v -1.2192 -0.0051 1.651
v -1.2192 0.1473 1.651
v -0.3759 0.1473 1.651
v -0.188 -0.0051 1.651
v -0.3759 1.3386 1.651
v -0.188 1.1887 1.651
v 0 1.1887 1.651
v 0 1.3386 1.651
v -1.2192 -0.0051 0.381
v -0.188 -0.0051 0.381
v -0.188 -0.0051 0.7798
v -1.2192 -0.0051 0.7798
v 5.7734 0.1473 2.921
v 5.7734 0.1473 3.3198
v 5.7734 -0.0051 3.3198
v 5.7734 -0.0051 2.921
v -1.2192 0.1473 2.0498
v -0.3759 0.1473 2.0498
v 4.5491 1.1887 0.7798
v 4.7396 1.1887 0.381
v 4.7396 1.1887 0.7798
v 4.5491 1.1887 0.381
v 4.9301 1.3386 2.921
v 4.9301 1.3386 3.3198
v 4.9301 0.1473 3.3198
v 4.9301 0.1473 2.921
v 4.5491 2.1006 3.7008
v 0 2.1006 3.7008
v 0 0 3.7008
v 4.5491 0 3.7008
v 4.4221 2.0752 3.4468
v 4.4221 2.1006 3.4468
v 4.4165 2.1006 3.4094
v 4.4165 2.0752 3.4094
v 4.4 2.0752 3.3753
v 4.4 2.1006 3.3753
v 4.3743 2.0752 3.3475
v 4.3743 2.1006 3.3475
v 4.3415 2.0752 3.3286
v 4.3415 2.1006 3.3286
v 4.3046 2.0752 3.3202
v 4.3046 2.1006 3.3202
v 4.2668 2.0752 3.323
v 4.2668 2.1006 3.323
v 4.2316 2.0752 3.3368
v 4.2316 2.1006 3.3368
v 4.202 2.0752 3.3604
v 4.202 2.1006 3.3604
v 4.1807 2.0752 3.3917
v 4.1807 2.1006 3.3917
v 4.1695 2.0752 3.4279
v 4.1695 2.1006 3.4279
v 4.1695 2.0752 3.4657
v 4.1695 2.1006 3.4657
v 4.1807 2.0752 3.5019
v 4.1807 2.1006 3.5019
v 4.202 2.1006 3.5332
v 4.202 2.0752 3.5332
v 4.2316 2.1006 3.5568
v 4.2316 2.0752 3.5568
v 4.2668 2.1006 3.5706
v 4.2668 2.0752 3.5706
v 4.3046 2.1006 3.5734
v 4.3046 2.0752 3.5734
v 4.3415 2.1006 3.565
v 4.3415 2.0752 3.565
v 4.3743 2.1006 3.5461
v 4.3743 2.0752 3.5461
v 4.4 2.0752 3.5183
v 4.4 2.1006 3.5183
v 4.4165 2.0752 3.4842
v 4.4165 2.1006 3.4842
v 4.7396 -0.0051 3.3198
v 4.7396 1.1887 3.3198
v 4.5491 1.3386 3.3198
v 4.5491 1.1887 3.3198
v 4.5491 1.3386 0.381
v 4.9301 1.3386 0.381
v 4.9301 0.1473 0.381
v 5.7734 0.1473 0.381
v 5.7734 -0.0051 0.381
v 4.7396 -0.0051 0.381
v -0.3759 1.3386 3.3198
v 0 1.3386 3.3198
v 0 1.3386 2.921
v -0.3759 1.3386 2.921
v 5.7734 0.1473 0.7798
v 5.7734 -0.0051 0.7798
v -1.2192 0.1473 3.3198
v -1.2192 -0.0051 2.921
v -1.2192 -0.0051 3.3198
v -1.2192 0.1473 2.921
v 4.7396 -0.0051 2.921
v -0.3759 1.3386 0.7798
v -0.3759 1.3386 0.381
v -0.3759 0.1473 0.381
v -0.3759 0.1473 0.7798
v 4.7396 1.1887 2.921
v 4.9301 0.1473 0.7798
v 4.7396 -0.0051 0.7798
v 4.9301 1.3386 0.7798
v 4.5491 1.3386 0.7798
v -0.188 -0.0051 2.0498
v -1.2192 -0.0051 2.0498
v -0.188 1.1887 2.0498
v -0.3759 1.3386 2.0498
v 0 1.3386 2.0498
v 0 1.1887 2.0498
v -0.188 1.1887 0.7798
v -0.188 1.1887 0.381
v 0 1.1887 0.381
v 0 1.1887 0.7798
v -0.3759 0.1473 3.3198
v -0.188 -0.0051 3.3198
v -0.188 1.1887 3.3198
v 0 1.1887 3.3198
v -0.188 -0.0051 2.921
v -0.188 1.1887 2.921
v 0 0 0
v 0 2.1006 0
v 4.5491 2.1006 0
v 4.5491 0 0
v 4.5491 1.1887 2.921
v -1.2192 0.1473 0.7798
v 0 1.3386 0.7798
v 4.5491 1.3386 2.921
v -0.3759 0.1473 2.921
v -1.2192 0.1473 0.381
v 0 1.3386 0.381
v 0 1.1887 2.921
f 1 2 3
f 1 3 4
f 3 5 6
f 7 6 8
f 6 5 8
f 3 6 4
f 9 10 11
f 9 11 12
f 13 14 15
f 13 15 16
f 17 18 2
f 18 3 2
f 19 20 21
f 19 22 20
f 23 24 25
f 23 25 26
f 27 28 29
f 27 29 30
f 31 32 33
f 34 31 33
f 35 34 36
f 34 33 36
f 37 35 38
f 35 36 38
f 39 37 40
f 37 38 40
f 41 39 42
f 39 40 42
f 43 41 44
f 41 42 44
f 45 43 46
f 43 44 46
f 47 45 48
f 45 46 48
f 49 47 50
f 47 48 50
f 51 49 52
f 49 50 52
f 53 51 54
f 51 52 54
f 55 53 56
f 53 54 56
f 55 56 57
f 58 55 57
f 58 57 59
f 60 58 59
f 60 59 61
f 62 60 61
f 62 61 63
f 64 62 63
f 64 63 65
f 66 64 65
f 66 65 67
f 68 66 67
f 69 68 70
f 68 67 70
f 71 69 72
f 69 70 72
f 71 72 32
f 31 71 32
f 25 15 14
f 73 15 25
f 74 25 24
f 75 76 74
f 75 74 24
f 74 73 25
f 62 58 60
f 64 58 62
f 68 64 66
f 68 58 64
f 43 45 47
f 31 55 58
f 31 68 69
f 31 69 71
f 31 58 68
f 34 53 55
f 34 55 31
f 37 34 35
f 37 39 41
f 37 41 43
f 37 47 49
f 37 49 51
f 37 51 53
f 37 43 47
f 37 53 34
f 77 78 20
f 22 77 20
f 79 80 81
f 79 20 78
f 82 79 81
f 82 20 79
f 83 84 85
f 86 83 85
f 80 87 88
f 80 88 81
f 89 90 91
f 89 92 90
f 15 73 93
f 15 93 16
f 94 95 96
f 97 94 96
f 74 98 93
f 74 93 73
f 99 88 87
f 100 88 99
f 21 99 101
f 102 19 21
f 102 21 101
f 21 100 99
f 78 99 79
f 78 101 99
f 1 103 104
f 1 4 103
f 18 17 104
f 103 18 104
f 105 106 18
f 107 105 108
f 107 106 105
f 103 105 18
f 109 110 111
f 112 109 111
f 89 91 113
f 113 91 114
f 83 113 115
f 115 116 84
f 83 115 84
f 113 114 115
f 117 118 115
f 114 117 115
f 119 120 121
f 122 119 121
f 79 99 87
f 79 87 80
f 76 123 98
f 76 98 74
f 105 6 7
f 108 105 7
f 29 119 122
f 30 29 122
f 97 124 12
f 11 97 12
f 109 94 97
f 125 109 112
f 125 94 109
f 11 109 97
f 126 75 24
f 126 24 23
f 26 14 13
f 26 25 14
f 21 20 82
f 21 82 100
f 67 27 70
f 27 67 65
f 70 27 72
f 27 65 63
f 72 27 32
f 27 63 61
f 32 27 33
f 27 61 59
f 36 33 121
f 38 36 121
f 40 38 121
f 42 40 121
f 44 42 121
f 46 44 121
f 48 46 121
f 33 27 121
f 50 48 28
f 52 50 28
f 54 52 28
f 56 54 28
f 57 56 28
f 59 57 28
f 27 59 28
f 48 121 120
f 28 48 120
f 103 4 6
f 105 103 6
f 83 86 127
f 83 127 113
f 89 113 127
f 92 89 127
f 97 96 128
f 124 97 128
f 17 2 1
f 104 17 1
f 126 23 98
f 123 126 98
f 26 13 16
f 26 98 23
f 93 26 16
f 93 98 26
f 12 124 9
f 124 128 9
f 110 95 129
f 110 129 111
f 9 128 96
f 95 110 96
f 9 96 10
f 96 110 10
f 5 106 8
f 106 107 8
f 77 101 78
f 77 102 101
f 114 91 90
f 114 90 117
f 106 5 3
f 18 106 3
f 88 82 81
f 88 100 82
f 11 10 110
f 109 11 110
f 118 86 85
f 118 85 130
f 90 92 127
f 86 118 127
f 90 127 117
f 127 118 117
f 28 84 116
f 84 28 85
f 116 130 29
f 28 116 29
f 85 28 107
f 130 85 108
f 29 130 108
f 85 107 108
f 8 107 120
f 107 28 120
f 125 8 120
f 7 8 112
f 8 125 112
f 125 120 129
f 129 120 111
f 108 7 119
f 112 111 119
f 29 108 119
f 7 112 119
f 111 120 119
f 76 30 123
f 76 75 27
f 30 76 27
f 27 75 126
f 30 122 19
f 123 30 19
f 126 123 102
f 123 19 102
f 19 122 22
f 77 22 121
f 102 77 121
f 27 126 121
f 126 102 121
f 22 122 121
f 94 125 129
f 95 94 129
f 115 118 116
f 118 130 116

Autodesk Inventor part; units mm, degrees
ref_plane "YZ Plane" through (0, 0, 0) normal (1, 0, 0) x (0, 1, 0)
ref_plane "XZ Plane" through (0, 0, 0) normal (0, 1, 0) x (-1, 0, 0)
ref_plane "XY Plane" through (0, 0, 0) normal (0, 0, 1) x (1, 0, 0)
sketch "Sketch1" plane through (0, 0, 0) normal (0, 0, 1) x (1, 0, 0)
  line L0 (0, 0) -> (4.5491, 0)
  line L1 (4.5491, 0) -> (4.5491, 2.1006)
  line L2 (4.5491, 2.1006) -> (0, 2.1006)
  line L3 (0, 2.1006) -> (0, 0)
  dimension "d0" = 2.1006
  dimension "d1" = 4.5491
extrude "Extrusion1" add sketch "Sketch1" along normal blind 3.7008
sketch "Sketch2" plane through (4.5491, 0, 0) normal (1, 0, 0) x (0, 0, -1)
  line L0 (-3.3198, 1.3386) -> (-2.921, 1.3386)
  line L1 (-2.921, 1.3386) -> (-2.921, 1.1887)
  line L2 (-2.921, 1.1887) -> (-3.3198, 1.1887)
  line L3 (-3.3198, 1.1887) -> (-3.3198, 1.3386)
  line L4 (-0.7798, 1.3386) -> (-0.381, 1.3386)
  line L5 (-0.381, 1.3386) -> (-0.381, 1.1887)
  line L6 (-0.381, 1.1887) -> (-0.7798, 1.1887)
  line L7 (-0.7798, 1.1887) -> (-0.7798, 1.3386)
  line L8 (0, 0) -> (0, 2.1006) projected
  line L9 (0, 2.1006) -> (-3.7008, 2.1006) projected
  dimension "d4" = 0.3988
  dimension "d5" = 0.3988
  dimension "d6" = 0.1499
  dimension "d7" = 0.1499
  dimension "d8" = 2.1412
  dimension "d9" = 0
  dimension "d10" = 0.381
  dimension "d11" = 0.762
extrude "Extrusion2" add sketch "Sketch2" against normal blind 4.7727
extrude "Extrusion3" add sketch "Sketch2" along normal blind 0.2286
sketch "Sketch3" plane through (4.7777, 0, 0) normal (1, 0, 0) x (0, 0, -1)
  line L0 (-3.3198, 1.3386) -> (-2.921, 1.3386)
  line L1 (-2.921, 1.3386) -> (-2.921, 1.1887)
  line L2 (-2.921, 1.1887) -> (-3.3198, 1.1887)
  line L3 (-3.3198, 1.1887) -> (-3.3198, 1.3386)
  line L4 (-0.7798, 1.3386) -> (-0.381, 1.3386)
  line L5 (-0.381, 1.3386) -> (-0.381, 1.1887)
  line L6 (-0.381, 1.1887) -> (-0.7798, 1.1887)
  line L7 (-0.7798, 1.1887) -> (-0.7798, 1.3386)
  point P0 (0, 0)
extrude "Extrusion4" add sketch "Sketch3" along normal blind 0.1524
sketch "Sketch4" plane through (-0.2235, 0, 0) normal (-1, 0, 0) x (0, 0, 1)
  line L0 (2.921, 1.3386) -> (3.3198, 1.3386)
  line L1 (3.3198, 1.3386) -> (3.3198, 1.1887)
  line L2 (3.3198, 1.1887) -> (2.921, 1.1887)
  line L3 (2.921, 1.1887) -> (2.921, 1.3386)
  line L4 (0.381, 1.3386) -> (0.7798, 1.3386)
  line L5 (0.7798, 1.3386) -> (0.7798, 1.1887)
  line L6 (0.7798, 1.1887) -> (0.381, 1.1887)
  line L7 (0.381, 1.1887) -> (0.381, 1.3386)
  point P0 (0, 0)
extrude "Extrusion5" add sketch "Sketch4" along normal blind 0.1524
sketch "Sketch5" plane through (0, 1.1887, 2.921) normal (0, -1, 0) x (1, 0, 0)
  line L0 (0, -2.1412) -> (-0.3759, -2.1412) projected
  line L1 (-0.3759, -2.54) -> (-0.188, -2.54)
  line L2 (-0.188, -2.54) -> (-0.188, -2.1412)
  line L3 (-0.188, -2.1412) -> (-0.3759, -2.1412)
  line L4 (-0.3759, -2.1412) -> (-0.3759, -2.54)
  line L5 (0, 0.3988) -> (-0.3759, 0.3988) projected
  line L6 (-0.3759, 0) -> (-0.188, 0)
  line L7 (-0.188, 0) -> (-0.188, 0.3988)
  line L8 (-0.188, 0.3988) -> (-0.3759, 0.3988)
  line L9 (-0.3759, 0.3988) -> (-0.3759, 0)
  line L10 (4.5491, -2.1412) -> (4.9301, -2.1412) projected
  line L11 (4.9301, -2.54) -> (4.7396, -2.54)
  line L12 (4.7396, -2.54) -> (4.7396, -2.1412)
  line L13 (4.7396, -2.1412) -> (4.9301, -2.1412)
  line L14 (4.9301, -2.1412) -> (4.9301, -2.54)
  line L15 (4.5491, 0.3988) -> (4.9301, 0.3988) projected
  line L16 (4.9301, 0) -> (4.7396, 0)
  line L17 (4.7396, 0) -> (4.7396, 0.3988)
  line L18 (4.7396, 0.3988) -> (4.9301, 0.3988)
  line L19 (4.9301, 0.3988) -> (4.9301, 0)
  point P0 (0, -2.921)
extrude "Extrusion6" add sketch "Sketch5" along normal blind 1.1938
sketch "Sketch6" plane through (4.9301, 0, 0) normal (1, 0, 0) x (0, 0, -1)
  line L0 (-0.7798, 1.3386) -> (-0.7798, -0.0051) projected
  line L1 (-0.381, -0.0051) -> (-0.7798, -0.0051)
  line L2 (-0.7798, -0.0051) -> (-0.7798, 0.1473)
  line L3 (-0.7798, 0.1473) -> (-0.381, 0.1473)
  line L4 (-0.381, 0.1473) -> (-0.381, -0.0051)
  line L5 (-3.3198, 1.3386) -> (-3.3198, -0.0051) projected
  line L6 (-2.921, -0.0051) -> (-3.3198, -0.0051)
  line L7 (-3.3198, -0.0051) -> (-3.3198, 0.1473)
  line L8 (-3.3198, 0.1473) -> (-2.921, 0.1473)
  line L9 (-2.921, 0.1473) -> (-2.921, -0.0051)
  point P0 (0, 0)
  dimension "d22" = 0.1524
extrude "Extrusion7" add sketch "Sketch6" along normal blind 0.8433
sketch "Sketch7" plane through (-0.3759, 0, 0) normal (-1, 0, 0) x (0, 0, 1)
  line L0 (0.7798, -0.0051) -> (0.381, -0.0051)
  line L1 (0.381, -0.0051) -> (0.381, 0.1473)
  line L2 (0.381, 0.1473) -> (0.7798, 0.1473)
  line L3 (0.7798, 0.1473) -> (0.7798, -0.0051)
  line L4 (2.921, -0.0051) -> (3.3198, -0.0051)
  line L5 (3.3198, -0.0051) -> (3.3198, 0.1473)
  line L6 (3.3198, 0.1473) -> (2.921, 0.1473)
  line L7 (2.921, 0.1473) -> (2.921, -0.0051)
  point P0 (0, 0)
extrude "Extrusion8" add sketch "Sketch7" along normal blind 0.8433
sketch "Sketch8" plane through (0, 1.1887, 0.7798) normal (0, 0, 1) x (1, 0, 0)
  line L0 (0, 0) -> (0, 0.1499)
  line L1 (0, 0.1499) -> (-0.3759, 0.1499)
  line L2 (0, 0.1499) -> (-0.3759, 0.1499) projected
  line L3 (-0.3759, 0.1499) -> (-0.3759, -1.0414)
  line L4 (-0.3759, -1.0414) -> (-1.2192, -1.0414)
  line L5 (-1.2192, -1.0414) -> (-1.2192, -1.1938)
  line L6 (-0.188, -1.1938) -> (-1.2192, -1.1938) projected
  line L7 (-1.2192, -1.1938) -> (-0.188, -1.1938)
  line L8 (-0.188, -1.1938) -> (-0.188, 0)
  line L9 (-0.188, 0) -> (0, 0)
  line L10 (0, 0) -> (-0.188, 0) projected
  point P0 (0, -1.1887)
extrude "Extrusion9" add sketch "Sketch8" along normal blind 1.27
extrude "Extrusion10" cut sketch "Sketch8" along normal blind 0.8712
sketch "Sketch9" plane through (0, 2.1006, 0) normal (0, 1, 0) x (1, 0, 0)
  circle A0 centre (4.2951, -3.4468) radius 0.127
  line L0 (4.5491, 0) -> (4.5491, -3.7008) projected
  line L1 (4.5491, -3.7008) -> (0, -3.7008) projected
  point P0 (0, 0)
  dimension "d31" = 0.254
  dimension "d32" = 0.254
  dimension "d33" = 0.254
extrude "Extrusion11" cut sketch "Sketch9" against normal blind 0.0254
properties part number "sTLP152 Optocoupler"
